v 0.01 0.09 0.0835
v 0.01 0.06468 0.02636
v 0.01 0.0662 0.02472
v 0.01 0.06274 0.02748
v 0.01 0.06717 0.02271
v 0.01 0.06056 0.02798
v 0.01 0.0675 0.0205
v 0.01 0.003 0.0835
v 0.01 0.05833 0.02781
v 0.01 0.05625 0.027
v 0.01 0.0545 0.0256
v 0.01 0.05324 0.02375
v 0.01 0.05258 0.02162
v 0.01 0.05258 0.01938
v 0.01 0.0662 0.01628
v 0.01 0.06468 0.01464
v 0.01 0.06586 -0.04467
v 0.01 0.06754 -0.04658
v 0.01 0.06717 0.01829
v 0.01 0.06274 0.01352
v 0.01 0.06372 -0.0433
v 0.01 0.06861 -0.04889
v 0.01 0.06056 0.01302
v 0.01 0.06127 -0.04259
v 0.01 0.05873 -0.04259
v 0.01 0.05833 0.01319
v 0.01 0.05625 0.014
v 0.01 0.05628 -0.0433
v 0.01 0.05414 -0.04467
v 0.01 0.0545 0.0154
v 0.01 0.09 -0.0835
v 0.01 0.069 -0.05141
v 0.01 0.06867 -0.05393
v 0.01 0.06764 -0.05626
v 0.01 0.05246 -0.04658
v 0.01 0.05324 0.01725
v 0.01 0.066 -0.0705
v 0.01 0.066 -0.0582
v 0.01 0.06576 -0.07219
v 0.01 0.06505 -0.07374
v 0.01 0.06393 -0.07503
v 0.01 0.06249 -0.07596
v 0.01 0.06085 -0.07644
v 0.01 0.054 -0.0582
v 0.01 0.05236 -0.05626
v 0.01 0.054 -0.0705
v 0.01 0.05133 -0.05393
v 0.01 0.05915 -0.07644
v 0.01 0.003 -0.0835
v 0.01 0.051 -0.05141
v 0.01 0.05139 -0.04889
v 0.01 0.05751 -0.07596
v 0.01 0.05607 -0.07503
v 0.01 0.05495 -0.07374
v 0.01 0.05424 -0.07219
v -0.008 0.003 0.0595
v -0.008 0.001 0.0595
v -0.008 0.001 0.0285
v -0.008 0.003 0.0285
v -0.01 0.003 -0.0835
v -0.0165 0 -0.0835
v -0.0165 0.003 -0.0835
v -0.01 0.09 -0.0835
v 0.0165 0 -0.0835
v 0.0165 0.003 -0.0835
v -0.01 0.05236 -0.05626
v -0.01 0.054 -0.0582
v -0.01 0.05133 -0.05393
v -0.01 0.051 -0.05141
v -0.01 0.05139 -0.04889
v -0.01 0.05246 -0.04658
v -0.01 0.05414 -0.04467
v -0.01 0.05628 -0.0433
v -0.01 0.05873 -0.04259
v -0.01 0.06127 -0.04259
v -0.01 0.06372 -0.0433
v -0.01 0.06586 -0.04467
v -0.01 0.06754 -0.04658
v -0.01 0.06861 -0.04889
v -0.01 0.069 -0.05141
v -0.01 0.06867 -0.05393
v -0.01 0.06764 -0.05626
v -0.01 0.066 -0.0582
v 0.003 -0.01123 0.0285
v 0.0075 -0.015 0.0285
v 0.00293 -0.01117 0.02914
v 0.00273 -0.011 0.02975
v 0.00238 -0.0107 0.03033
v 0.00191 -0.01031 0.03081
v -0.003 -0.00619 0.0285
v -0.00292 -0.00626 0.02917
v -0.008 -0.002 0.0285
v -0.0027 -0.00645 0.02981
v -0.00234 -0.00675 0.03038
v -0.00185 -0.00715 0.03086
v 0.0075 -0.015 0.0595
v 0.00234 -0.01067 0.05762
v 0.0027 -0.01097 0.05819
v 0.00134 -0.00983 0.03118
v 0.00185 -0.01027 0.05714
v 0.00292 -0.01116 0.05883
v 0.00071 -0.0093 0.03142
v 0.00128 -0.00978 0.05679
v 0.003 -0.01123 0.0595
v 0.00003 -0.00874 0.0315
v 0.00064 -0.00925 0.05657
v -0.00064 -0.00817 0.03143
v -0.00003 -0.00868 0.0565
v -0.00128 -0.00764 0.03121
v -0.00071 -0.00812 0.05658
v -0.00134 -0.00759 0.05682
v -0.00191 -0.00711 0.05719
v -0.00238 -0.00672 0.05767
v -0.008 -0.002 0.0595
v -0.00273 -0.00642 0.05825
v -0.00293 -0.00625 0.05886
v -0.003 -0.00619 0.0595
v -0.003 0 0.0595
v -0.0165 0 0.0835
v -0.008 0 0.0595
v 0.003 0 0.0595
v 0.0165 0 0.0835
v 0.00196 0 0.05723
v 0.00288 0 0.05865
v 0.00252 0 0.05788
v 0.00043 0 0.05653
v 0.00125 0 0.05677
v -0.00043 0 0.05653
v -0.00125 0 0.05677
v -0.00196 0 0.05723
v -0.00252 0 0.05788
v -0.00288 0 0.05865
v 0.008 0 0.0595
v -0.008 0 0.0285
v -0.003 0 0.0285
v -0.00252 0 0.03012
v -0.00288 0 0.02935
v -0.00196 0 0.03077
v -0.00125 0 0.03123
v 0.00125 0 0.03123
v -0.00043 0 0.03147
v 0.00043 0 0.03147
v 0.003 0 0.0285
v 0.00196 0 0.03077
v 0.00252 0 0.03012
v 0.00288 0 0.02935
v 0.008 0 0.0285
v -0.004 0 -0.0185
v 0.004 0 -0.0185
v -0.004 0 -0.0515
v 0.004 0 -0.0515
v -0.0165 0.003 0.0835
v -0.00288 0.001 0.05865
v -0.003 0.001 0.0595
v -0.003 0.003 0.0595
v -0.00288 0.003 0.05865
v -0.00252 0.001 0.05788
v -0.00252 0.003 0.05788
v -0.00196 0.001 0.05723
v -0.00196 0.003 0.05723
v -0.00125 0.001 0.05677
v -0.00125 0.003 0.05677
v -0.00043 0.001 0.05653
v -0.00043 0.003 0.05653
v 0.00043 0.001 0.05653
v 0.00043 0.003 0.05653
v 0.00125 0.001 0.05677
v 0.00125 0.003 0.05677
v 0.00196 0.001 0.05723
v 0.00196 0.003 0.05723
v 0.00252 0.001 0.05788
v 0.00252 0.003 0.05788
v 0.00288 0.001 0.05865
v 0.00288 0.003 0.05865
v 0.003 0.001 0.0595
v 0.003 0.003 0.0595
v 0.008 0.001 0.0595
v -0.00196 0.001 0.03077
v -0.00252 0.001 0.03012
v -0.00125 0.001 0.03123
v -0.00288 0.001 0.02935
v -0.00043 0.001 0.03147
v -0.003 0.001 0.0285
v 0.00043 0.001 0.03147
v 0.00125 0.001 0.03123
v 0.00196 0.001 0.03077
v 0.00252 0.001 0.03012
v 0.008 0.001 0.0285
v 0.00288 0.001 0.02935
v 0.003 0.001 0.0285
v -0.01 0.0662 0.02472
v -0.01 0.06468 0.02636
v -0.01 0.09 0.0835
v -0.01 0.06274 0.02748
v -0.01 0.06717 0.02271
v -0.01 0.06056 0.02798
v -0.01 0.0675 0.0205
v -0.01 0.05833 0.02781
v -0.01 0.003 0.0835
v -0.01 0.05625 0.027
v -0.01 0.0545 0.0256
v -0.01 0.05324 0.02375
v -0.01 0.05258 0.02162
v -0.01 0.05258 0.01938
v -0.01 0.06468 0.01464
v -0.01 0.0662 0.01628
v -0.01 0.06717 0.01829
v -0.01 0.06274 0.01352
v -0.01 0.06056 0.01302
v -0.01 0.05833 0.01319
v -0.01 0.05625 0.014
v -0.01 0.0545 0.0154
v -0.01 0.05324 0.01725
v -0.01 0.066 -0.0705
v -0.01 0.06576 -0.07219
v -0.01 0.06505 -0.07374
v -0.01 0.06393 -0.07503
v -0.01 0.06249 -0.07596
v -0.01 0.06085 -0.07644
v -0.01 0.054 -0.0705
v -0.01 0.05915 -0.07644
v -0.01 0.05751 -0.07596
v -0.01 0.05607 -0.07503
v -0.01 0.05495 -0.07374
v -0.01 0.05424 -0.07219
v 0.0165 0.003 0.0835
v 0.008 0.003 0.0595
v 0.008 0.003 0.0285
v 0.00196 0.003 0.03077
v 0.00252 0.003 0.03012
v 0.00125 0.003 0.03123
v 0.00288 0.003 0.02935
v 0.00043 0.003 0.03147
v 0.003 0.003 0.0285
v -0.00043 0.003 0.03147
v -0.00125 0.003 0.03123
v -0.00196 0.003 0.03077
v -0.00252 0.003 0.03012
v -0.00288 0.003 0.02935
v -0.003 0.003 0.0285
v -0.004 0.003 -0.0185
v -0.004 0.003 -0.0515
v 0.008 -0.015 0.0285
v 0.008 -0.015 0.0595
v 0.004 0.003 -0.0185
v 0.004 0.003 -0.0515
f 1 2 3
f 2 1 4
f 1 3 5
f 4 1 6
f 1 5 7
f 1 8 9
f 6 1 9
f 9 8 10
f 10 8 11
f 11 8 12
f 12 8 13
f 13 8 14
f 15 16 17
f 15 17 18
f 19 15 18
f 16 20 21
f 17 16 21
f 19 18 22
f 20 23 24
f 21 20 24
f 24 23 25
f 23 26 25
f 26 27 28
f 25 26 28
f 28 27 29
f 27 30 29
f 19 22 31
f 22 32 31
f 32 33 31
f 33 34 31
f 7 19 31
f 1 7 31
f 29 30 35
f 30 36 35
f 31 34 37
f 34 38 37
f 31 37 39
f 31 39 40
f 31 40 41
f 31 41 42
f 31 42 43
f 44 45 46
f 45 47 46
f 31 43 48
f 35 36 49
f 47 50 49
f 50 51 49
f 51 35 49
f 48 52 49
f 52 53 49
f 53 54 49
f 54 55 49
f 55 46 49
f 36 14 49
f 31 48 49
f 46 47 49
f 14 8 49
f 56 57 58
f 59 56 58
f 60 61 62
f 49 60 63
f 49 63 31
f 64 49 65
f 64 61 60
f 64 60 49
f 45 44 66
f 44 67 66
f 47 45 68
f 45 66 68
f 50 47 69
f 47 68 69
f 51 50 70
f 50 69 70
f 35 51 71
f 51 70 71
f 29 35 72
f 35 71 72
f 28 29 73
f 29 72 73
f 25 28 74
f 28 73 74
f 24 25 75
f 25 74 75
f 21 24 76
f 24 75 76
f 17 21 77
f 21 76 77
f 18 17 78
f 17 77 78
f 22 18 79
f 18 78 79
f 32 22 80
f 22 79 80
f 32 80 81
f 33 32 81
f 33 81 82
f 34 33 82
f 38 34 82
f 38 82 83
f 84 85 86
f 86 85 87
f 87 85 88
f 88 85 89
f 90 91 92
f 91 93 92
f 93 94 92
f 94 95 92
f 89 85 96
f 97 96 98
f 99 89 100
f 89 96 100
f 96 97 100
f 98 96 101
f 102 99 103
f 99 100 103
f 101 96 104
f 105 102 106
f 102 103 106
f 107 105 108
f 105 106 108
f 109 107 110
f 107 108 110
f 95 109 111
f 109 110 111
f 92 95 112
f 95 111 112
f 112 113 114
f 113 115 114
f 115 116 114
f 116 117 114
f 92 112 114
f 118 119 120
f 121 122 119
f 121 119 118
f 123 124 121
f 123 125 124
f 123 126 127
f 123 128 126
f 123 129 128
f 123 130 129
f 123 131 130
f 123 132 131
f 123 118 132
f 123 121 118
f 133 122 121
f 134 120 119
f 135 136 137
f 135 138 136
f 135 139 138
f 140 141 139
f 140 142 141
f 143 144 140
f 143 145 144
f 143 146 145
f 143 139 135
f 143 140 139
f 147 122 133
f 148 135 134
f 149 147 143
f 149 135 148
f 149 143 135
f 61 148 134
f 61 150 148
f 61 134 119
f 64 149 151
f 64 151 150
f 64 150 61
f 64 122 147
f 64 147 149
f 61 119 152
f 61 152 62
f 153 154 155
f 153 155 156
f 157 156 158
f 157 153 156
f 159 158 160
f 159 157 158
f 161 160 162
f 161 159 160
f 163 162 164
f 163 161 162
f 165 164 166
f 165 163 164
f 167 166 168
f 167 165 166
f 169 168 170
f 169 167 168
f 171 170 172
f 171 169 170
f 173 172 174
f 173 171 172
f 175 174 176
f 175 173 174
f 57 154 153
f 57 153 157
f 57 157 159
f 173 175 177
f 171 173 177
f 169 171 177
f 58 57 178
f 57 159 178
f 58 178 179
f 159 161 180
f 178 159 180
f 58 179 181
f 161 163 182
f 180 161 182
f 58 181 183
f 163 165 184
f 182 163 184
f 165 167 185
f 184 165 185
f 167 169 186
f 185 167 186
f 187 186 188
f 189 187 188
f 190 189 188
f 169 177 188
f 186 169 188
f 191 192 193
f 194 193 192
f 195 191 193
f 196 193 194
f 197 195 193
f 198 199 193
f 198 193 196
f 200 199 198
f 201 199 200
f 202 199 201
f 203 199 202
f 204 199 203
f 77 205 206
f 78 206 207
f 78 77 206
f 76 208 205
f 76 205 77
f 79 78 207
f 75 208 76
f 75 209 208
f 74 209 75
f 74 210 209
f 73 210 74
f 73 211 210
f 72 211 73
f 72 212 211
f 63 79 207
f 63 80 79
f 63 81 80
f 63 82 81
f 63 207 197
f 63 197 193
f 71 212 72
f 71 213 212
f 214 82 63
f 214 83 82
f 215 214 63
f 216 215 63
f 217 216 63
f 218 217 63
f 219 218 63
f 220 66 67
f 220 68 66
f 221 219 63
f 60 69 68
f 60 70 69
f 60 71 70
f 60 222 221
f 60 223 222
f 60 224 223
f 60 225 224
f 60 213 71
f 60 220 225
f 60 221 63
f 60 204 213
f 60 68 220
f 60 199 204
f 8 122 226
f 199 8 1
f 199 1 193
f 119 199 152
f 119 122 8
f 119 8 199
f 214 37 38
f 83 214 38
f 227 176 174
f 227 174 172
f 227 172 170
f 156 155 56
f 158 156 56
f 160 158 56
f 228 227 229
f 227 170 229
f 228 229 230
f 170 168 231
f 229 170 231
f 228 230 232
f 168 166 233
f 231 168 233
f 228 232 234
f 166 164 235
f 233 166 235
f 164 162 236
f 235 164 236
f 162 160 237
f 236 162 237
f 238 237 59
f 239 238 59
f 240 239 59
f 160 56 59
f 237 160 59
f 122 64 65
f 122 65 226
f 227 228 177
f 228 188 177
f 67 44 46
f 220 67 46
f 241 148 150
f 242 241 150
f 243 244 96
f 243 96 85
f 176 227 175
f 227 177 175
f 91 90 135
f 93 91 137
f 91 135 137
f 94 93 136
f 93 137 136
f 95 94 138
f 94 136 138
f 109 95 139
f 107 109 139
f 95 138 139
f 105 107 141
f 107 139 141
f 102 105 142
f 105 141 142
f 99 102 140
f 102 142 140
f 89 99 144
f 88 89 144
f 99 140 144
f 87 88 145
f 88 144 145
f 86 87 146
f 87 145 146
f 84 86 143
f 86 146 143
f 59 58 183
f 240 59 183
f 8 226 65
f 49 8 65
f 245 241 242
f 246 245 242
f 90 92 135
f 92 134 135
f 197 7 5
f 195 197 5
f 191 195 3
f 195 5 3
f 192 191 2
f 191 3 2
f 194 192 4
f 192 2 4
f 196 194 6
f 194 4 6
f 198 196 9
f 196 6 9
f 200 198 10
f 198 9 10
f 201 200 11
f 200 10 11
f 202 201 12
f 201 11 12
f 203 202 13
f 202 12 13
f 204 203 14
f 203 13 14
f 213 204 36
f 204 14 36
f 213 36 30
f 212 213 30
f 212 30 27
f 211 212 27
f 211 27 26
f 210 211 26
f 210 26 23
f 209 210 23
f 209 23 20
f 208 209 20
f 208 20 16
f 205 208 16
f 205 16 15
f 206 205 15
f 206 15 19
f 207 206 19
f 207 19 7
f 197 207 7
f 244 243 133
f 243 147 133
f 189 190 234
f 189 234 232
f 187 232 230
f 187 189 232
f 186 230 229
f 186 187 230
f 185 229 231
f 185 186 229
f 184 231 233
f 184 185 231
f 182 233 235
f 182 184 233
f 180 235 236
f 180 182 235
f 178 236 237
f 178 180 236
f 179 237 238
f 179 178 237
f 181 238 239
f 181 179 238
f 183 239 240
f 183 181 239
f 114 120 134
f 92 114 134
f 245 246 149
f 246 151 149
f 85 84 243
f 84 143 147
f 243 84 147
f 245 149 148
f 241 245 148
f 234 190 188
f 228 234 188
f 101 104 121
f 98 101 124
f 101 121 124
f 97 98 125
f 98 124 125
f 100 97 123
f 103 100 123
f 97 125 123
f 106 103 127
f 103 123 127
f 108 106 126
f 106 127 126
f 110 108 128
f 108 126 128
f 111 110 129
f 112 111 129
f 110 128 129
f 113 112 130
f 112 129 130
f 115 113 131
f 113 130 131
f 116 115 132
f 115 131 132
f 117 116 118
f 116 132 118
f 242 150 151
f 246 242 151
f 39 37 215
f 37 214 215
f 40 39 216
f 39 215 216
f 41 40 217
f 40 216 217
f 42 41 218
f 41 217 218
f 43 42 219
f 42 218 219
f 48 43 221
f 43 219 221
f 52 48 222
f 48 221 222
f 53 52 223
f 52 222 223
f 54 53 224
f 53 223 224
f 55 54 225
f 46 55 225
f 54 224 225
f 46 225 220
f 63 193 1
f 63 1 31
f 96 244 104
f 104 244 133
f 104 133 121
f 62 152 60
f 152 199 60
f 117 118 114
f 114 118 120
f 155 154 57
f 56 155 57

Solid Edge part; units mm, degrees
sketch "Sketch1" plane through (0, 0, 0) normal (0, -1, 0) x (1, 0, 0)
  line L0 (-0.0165, -0.0835) -> (0.0165, -0.0835)
  line L1 (0.0165, -0.0835) -> (0.0165, 0.0835)
  line L2 (0.0165, 0.0835) -> (-0.0165, 0.0835)
  line L3 (-0.0165, 0.0835) -> (-0.0165, -0.0835)
  dimension "D1" = 0.167
  dimension "D2" = 0.033
extrude "Protrusion1" add sketch "Sketch1" against normal blind 0.003
sketch "Sketch2" plane through (0, 0, 0) normal (0, -1, 0) x (0, 0, -1)
  line L0 (-0.0595, -0.008) -> (-0.0285, -0.008)
  line L1 (-0.0285, -0.008) -> (-0.0285, -0.003)
  line L2 (-0.0285, 0.003) -> (-0.0285, 0.008)
  line L3 (-0.0285, 0.008) -> (-0.0595, 0.008)
  line L4 (-0.0595, 0.008) -> (-0.0595, 0.003)
  line L5 (-0.0595, -0.003) -> (-0.0595, -0.008)
  arc A0 (-0.0595, 0.003) -> (-0.0595, -0.003) centre (-0.0595, 0) cw
  arc A1 (-0.0285, -0.003) -> (-0.0285, 0.003) centre (-0.0285, 0) cw
  line L6 (0.0185, -0.004) -> (0.0515, -0.004)
  line L7 (0.0515, -0.004) -> (0.0515, 0.004)
  line L8 (0.0515, 0.004) -> (0.0185, 0.004)
  line L9 (0.0185, 0.004) -> (0.0185, -0.004)
  dimension "D1" = 0.0515
  dimension "D2" = 0.0515
  dimension "D3" = 0.0285
  dimension "D4" = 0.0285
extrude "Cutout1" cut sketch "Sketch2" against normal through all
sketch "Sketch3" plane through (0, 0, 0) normal (1, 0, 0) x (0, 1, 0)
  line L0 (0.003, 0.0835) -> (0.09, 0.0835)
  line L1 (0.09, 0.0835) -> (0.09, -0.0835)
  line L2 (0.09, -0.0835) -> (0.003, -0.0835)
  line L3 (0.003, 0.0835) -> (0.003, -0.0835)
  dimension "D1" = 0.167
  dimension "D2" = 0.09
extrude "Ausprägung_2" add sketch "Sketch3" along normal mid plane 0.02
sketch "Sketch4" plane through (0, 0, 0) normal (1, 0, 0) x (0, 1, 0)
  circle A0 centre (0.06, 0.0205) radius 0.0075
  line L0 (0.054, -0.0582) -> (0.054, -0.0705)
  arc A1 (0.066, -0.0582) -> (0.054, -0.0582) centre (0.06, -0.0515) ccw
  line L1 (0.066, -0.0705) -> (0.066, -0.0582)
  arc A2 (0.054, -0.0705) -> (0.066, -0.0705) centre (0.06, -0.0705) ccw
extrude "Cutout2" cut sketch "Sketch4" along normal through all and the other way through all
sketch "Sketch5" plane through (0, 0.001, 0) normal (0, -1, 0) x (0, 0, -1)
  line L0 (-0.0285, 0.003) -> (-0.0285, 0.008)
  line L1 (-0.0285, 0.008) -> (-0.0595, 0.008)
  line L2 (-0.0595, 0.008) -> (-0.0595, 0.003)
  arc A0 (-0.0595, 0.003) -> (-0.0595, -0.003) centre (-0.0595, 0) cw
  line L3 (-0.0595, -0.003) -> (-0.0595, -0.008)
  line L4 (-0.0595, -0.008) -> (-0.0285, -0.008)
  line L5 (-0.0285, -0.008) -> (-0.0285, -0.003)
  arc A1 (-0.0285, -0.003) -> (-0.0285, 0.003) centre (-0.0285, 0) cw
extrude "Ausprägung_4" add sketch "Sketch5" along normal blind 0.016
sketch "Sketch6" plane through (0, 0.045, 0.0835) normal (0, 0, 1) x (1, 0, 0)
  line L0 (-0.008, -0.06) -> (0.0075, -0.06)
  line L1 (0.0075, -0.06) -> (-0.008, -0.047)
  line L2 (-0.008, -0.06) -> (-0.008, -0.047)
  dimension "D1" = 0.002
  dimension "D2" = 0.0005
extrude "Cutout3" cut sketch "Sketch6" against normal through all
